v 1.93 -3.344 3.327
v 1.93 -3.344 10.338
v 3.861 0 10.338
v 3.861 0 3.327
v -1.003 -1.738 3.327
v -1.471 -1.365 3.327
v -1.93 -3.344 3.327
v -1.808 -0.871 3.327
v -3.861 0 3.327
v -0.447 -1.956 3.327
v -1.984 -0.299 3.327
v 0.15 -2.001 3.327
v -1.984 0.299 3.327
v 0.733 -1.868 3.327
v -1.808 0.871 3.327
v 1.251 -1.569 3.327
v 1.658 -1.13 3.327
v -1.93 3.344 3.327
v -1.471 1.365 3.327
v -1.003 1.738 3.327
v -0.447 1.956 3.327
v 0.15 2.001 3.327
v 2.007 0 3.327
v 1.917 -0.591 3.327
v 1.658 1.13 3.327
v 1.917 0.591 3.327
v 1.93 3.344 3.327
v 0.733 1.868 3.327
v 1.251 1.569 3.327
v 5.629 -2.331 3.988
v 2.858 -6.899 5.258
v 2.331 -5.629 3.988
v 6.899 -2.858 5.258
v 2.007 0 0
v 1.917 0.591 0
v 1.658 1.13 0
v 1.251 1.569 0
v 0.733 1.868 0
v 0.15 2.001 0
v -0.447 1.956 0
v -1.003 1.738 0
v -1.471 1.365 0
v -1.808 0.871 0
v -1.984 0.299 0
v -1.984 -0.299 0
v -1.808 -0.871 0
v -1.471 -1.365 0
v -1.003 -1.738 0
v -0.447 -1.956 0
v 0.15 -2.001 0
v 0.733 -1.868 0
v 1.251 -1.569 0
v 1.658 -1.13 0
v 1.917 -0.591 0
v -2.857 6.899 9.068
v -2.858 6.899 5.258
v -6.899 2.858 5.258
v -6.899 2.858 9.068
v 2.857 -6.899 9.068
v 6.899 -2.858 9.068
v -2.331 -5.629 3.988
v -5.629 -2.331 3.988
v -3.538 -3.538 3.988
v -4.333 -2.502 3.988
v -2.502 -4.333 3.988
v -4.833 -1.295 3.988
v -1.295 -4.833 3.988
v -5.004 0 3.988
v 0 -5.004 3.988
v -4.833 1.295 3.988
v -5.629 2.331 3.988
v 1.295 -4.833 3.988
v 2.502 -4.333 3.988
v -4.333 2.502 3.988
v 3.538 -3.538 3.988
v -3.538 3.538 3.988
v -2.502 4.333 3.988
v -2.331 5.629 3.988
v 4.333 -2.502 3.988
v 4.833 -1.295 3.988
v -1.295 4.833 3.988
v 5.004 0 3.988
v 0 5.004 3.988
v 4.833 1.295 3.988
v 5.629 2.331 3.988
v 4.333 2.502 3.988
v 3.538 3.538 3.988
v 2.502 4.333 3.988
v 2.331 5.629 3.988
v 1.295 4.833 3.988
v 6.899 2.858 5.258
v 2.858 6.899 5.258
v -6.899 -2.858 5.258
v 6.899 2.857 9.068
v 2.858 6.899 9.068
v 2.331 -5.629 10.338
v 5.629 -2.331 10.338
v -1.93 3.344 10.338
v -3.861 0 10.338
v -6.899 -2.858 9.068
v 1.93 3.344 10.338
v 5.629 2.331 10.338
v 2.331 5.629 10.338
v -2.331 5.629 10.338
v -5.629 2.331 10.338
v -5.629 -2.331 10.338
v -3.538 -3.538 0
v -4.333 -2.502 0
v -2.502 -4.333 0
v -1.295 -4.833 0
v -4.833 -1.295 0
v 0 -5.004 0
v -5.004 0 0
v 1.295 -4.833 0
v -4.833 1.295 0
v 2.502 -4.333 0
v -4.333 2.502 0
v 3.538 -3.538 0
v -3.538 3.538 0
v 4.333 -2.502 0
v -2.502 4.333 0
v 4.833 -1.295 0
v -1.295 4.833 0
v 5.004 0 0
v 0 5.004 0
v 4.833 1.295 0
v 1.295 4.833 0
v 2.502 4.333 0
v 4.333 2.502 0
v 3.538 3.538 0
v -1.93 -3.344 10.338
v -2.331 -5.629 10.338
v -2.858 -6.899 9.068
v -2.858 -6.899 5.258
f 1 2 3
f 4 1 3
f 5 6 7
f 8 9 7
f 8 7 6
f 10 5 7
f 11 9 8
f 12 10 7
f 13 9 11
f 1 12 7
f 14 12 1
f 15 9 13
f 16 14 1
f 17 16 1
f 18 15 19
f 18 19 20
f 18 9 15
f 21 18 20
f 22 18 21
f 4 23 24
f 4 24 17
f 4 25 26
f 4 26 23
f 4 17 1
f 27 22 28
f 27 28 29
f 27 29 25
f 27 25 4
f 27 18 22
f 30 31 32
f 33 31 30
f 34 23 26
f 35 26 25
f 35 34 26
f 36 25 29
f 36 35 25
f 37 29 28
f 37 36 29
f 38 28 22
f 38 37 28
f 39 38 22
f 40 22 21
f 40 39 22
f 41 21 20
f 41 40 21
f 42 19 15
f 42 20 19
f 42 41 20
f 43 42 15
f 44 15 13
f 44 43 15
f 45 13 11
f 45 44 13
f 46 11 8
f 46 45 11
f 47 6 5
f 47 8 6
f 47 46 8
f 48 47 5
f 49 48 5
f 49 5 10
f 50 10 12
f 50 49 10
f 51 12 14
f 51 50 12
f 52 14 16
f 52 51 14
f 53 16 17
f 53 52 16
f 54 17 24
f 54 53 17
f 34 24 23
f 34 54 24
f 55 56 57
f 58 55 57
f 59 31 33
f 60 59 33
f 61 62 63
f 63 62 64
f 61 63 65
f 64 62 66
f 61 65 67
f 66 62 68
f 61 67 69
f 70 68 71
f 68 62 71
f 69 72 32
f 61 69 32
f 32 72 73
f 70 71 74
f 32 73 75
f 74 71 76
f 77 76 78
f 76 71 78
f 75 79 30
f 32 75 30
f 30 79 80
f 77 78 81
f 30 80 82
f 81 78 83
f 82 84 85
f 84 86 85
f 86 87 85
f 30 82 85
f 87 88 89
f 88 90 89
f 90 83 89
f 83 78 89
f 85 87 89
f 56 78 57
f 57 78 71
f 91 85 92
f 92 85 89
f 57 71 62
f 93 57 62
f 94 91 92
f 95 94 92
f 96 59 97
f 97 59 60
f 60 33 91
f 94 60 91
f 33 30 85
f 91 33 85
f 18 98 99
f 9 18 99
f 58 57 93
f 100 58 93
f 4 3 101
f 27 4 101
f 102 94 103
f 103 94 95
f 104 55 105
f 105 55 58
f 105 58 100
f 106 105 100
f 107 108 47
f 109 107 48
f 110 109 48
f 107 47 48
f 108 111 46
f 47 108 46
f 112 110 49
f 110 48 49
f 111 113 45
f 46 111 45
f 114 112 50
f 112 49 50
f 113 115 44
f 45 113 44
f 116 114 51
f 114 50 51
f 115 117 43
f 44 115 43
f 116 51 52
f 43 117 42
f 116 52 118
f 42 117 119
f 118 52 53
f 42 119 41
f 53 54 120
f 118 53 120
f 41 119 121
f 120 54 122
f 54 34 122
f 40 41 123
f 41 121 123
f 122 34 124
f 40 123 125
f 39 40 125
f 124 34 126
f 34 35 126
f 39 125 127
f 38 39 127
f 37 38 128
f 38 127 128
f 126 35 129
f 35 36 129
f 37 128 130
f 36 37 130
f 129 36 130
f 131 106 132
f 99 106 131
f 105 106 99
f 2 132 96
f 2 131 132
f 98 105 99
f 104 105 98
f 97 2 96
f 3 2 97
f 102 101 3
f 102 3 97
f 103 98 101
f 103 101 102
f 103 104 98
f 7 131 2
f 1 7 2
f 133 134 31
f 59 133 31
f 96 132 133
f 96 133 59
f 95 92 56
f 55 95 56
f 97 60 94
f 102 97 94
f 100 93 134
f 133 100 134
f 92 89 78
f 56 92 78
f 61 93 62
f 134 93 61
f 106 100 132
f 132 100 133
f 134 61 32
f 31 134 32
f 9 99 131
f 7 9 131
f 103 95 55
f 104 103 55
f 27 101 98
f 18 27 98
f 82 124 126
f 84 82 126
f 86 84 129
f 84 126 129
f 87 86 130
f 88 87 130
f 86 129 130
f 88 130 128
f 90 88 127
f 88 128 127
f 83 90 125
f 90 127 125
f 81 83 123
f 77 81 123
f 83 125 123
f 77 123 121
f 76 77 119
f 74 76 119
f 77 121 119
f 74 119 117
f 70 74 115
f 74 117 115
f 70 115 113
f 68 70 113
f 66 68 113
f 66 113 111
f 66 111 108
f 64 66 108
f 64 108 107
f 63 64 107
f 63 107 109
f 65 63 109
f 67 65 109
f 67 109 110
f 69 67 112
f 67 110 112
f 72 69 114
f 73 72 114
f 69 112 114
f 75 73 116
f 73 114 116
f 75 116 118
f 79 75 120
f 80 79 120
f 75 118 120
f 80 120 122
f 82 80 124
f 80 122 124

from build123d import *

# Parameters (mm, degrees)
F0_R     = 5.0038
F0_R_2   = 2.0066
F1_DEPTH = 3.9878
F2_R     = 5.0038
F2_R_2   = 2.0066
F3_DEPTH = 6.35
F4_SIZE  = 1.27
F6_DEPTH = 7.0104


with BuildPart() as f1:
    # F0 (on Top) → F1 (new body)
    with BuildSketch(Plane.XY):
        Circle(F0_R)
        Circle(F0_R_2, mode=Mode.SUBTRACT)
    extrude(amount=F1_DEPTH)

    # F2 (on face) → F3 (join)
    with BuildSketch(Plane.XY.offset(3.9878)):
        Polygon((-2.8575, -6.898615), (2.8575, -6.898615), (6.898615, -2.8575), (6.898615, 2.8575), (2.8575, 6.898615), (-2.8575, 6.898615), (-6.898615, 2.8575), (-6.898615, -2.8575), align=None)
        Circle(F2_R, mode=Mode.SUBTRACT)
        Circle(F2_R)
        Circle(F2_R_2, mode=Mode.SUBTRACT)
    extrude(amount=F3_DEPTH)

    # F4
    f4_edges = [f1.edges().sort_by_distance(p)[0] for p in [
        (-6.898615, 0, 10.3378),
        (-4.878058, 4.878058, 10.3378),
        (0, 6.898615, 10.3378),
        (4.878058, 4.878058, 10.3378),
        (6.898615, 0, 10.3378),
        (4.878058, -4.878058, 10.3378),
        (0, -6.898615, 10.3378),
        (-4.878058, -4.878058, 10.3378),
        (0, -6.898615, 3.9878),
        (-4.878058, -4.878058, 3.9878),
        (4.878058, -4.878058, 3.9878),
        (-6.898615, 0, 3.9878),
        (6.898615, 0, 3.9878),
        (4.878058, 4.878058, 3.9878),
        (0, 6.898615, 3.9878),
        (-4.878058, 4.878058, 3.9878),
    ]]
    chamfer(f4_edges, length=F4_SIZE)

    # F5 (on face) → F6 (cut)
    with BuildSketch(Plane.XY.offset(10.3378)):
        Polygon((1.9304, -3.343551), (3.8608, 0), (1.9304, 3.343551), (-1.9304, 3.343551), (-3.8608, 0), (-1.9304, -3.343551), align=None)
    extrude(amount=-F6_DEPTH, mode=Mode.SUBTRACT)


solid = f1.part
